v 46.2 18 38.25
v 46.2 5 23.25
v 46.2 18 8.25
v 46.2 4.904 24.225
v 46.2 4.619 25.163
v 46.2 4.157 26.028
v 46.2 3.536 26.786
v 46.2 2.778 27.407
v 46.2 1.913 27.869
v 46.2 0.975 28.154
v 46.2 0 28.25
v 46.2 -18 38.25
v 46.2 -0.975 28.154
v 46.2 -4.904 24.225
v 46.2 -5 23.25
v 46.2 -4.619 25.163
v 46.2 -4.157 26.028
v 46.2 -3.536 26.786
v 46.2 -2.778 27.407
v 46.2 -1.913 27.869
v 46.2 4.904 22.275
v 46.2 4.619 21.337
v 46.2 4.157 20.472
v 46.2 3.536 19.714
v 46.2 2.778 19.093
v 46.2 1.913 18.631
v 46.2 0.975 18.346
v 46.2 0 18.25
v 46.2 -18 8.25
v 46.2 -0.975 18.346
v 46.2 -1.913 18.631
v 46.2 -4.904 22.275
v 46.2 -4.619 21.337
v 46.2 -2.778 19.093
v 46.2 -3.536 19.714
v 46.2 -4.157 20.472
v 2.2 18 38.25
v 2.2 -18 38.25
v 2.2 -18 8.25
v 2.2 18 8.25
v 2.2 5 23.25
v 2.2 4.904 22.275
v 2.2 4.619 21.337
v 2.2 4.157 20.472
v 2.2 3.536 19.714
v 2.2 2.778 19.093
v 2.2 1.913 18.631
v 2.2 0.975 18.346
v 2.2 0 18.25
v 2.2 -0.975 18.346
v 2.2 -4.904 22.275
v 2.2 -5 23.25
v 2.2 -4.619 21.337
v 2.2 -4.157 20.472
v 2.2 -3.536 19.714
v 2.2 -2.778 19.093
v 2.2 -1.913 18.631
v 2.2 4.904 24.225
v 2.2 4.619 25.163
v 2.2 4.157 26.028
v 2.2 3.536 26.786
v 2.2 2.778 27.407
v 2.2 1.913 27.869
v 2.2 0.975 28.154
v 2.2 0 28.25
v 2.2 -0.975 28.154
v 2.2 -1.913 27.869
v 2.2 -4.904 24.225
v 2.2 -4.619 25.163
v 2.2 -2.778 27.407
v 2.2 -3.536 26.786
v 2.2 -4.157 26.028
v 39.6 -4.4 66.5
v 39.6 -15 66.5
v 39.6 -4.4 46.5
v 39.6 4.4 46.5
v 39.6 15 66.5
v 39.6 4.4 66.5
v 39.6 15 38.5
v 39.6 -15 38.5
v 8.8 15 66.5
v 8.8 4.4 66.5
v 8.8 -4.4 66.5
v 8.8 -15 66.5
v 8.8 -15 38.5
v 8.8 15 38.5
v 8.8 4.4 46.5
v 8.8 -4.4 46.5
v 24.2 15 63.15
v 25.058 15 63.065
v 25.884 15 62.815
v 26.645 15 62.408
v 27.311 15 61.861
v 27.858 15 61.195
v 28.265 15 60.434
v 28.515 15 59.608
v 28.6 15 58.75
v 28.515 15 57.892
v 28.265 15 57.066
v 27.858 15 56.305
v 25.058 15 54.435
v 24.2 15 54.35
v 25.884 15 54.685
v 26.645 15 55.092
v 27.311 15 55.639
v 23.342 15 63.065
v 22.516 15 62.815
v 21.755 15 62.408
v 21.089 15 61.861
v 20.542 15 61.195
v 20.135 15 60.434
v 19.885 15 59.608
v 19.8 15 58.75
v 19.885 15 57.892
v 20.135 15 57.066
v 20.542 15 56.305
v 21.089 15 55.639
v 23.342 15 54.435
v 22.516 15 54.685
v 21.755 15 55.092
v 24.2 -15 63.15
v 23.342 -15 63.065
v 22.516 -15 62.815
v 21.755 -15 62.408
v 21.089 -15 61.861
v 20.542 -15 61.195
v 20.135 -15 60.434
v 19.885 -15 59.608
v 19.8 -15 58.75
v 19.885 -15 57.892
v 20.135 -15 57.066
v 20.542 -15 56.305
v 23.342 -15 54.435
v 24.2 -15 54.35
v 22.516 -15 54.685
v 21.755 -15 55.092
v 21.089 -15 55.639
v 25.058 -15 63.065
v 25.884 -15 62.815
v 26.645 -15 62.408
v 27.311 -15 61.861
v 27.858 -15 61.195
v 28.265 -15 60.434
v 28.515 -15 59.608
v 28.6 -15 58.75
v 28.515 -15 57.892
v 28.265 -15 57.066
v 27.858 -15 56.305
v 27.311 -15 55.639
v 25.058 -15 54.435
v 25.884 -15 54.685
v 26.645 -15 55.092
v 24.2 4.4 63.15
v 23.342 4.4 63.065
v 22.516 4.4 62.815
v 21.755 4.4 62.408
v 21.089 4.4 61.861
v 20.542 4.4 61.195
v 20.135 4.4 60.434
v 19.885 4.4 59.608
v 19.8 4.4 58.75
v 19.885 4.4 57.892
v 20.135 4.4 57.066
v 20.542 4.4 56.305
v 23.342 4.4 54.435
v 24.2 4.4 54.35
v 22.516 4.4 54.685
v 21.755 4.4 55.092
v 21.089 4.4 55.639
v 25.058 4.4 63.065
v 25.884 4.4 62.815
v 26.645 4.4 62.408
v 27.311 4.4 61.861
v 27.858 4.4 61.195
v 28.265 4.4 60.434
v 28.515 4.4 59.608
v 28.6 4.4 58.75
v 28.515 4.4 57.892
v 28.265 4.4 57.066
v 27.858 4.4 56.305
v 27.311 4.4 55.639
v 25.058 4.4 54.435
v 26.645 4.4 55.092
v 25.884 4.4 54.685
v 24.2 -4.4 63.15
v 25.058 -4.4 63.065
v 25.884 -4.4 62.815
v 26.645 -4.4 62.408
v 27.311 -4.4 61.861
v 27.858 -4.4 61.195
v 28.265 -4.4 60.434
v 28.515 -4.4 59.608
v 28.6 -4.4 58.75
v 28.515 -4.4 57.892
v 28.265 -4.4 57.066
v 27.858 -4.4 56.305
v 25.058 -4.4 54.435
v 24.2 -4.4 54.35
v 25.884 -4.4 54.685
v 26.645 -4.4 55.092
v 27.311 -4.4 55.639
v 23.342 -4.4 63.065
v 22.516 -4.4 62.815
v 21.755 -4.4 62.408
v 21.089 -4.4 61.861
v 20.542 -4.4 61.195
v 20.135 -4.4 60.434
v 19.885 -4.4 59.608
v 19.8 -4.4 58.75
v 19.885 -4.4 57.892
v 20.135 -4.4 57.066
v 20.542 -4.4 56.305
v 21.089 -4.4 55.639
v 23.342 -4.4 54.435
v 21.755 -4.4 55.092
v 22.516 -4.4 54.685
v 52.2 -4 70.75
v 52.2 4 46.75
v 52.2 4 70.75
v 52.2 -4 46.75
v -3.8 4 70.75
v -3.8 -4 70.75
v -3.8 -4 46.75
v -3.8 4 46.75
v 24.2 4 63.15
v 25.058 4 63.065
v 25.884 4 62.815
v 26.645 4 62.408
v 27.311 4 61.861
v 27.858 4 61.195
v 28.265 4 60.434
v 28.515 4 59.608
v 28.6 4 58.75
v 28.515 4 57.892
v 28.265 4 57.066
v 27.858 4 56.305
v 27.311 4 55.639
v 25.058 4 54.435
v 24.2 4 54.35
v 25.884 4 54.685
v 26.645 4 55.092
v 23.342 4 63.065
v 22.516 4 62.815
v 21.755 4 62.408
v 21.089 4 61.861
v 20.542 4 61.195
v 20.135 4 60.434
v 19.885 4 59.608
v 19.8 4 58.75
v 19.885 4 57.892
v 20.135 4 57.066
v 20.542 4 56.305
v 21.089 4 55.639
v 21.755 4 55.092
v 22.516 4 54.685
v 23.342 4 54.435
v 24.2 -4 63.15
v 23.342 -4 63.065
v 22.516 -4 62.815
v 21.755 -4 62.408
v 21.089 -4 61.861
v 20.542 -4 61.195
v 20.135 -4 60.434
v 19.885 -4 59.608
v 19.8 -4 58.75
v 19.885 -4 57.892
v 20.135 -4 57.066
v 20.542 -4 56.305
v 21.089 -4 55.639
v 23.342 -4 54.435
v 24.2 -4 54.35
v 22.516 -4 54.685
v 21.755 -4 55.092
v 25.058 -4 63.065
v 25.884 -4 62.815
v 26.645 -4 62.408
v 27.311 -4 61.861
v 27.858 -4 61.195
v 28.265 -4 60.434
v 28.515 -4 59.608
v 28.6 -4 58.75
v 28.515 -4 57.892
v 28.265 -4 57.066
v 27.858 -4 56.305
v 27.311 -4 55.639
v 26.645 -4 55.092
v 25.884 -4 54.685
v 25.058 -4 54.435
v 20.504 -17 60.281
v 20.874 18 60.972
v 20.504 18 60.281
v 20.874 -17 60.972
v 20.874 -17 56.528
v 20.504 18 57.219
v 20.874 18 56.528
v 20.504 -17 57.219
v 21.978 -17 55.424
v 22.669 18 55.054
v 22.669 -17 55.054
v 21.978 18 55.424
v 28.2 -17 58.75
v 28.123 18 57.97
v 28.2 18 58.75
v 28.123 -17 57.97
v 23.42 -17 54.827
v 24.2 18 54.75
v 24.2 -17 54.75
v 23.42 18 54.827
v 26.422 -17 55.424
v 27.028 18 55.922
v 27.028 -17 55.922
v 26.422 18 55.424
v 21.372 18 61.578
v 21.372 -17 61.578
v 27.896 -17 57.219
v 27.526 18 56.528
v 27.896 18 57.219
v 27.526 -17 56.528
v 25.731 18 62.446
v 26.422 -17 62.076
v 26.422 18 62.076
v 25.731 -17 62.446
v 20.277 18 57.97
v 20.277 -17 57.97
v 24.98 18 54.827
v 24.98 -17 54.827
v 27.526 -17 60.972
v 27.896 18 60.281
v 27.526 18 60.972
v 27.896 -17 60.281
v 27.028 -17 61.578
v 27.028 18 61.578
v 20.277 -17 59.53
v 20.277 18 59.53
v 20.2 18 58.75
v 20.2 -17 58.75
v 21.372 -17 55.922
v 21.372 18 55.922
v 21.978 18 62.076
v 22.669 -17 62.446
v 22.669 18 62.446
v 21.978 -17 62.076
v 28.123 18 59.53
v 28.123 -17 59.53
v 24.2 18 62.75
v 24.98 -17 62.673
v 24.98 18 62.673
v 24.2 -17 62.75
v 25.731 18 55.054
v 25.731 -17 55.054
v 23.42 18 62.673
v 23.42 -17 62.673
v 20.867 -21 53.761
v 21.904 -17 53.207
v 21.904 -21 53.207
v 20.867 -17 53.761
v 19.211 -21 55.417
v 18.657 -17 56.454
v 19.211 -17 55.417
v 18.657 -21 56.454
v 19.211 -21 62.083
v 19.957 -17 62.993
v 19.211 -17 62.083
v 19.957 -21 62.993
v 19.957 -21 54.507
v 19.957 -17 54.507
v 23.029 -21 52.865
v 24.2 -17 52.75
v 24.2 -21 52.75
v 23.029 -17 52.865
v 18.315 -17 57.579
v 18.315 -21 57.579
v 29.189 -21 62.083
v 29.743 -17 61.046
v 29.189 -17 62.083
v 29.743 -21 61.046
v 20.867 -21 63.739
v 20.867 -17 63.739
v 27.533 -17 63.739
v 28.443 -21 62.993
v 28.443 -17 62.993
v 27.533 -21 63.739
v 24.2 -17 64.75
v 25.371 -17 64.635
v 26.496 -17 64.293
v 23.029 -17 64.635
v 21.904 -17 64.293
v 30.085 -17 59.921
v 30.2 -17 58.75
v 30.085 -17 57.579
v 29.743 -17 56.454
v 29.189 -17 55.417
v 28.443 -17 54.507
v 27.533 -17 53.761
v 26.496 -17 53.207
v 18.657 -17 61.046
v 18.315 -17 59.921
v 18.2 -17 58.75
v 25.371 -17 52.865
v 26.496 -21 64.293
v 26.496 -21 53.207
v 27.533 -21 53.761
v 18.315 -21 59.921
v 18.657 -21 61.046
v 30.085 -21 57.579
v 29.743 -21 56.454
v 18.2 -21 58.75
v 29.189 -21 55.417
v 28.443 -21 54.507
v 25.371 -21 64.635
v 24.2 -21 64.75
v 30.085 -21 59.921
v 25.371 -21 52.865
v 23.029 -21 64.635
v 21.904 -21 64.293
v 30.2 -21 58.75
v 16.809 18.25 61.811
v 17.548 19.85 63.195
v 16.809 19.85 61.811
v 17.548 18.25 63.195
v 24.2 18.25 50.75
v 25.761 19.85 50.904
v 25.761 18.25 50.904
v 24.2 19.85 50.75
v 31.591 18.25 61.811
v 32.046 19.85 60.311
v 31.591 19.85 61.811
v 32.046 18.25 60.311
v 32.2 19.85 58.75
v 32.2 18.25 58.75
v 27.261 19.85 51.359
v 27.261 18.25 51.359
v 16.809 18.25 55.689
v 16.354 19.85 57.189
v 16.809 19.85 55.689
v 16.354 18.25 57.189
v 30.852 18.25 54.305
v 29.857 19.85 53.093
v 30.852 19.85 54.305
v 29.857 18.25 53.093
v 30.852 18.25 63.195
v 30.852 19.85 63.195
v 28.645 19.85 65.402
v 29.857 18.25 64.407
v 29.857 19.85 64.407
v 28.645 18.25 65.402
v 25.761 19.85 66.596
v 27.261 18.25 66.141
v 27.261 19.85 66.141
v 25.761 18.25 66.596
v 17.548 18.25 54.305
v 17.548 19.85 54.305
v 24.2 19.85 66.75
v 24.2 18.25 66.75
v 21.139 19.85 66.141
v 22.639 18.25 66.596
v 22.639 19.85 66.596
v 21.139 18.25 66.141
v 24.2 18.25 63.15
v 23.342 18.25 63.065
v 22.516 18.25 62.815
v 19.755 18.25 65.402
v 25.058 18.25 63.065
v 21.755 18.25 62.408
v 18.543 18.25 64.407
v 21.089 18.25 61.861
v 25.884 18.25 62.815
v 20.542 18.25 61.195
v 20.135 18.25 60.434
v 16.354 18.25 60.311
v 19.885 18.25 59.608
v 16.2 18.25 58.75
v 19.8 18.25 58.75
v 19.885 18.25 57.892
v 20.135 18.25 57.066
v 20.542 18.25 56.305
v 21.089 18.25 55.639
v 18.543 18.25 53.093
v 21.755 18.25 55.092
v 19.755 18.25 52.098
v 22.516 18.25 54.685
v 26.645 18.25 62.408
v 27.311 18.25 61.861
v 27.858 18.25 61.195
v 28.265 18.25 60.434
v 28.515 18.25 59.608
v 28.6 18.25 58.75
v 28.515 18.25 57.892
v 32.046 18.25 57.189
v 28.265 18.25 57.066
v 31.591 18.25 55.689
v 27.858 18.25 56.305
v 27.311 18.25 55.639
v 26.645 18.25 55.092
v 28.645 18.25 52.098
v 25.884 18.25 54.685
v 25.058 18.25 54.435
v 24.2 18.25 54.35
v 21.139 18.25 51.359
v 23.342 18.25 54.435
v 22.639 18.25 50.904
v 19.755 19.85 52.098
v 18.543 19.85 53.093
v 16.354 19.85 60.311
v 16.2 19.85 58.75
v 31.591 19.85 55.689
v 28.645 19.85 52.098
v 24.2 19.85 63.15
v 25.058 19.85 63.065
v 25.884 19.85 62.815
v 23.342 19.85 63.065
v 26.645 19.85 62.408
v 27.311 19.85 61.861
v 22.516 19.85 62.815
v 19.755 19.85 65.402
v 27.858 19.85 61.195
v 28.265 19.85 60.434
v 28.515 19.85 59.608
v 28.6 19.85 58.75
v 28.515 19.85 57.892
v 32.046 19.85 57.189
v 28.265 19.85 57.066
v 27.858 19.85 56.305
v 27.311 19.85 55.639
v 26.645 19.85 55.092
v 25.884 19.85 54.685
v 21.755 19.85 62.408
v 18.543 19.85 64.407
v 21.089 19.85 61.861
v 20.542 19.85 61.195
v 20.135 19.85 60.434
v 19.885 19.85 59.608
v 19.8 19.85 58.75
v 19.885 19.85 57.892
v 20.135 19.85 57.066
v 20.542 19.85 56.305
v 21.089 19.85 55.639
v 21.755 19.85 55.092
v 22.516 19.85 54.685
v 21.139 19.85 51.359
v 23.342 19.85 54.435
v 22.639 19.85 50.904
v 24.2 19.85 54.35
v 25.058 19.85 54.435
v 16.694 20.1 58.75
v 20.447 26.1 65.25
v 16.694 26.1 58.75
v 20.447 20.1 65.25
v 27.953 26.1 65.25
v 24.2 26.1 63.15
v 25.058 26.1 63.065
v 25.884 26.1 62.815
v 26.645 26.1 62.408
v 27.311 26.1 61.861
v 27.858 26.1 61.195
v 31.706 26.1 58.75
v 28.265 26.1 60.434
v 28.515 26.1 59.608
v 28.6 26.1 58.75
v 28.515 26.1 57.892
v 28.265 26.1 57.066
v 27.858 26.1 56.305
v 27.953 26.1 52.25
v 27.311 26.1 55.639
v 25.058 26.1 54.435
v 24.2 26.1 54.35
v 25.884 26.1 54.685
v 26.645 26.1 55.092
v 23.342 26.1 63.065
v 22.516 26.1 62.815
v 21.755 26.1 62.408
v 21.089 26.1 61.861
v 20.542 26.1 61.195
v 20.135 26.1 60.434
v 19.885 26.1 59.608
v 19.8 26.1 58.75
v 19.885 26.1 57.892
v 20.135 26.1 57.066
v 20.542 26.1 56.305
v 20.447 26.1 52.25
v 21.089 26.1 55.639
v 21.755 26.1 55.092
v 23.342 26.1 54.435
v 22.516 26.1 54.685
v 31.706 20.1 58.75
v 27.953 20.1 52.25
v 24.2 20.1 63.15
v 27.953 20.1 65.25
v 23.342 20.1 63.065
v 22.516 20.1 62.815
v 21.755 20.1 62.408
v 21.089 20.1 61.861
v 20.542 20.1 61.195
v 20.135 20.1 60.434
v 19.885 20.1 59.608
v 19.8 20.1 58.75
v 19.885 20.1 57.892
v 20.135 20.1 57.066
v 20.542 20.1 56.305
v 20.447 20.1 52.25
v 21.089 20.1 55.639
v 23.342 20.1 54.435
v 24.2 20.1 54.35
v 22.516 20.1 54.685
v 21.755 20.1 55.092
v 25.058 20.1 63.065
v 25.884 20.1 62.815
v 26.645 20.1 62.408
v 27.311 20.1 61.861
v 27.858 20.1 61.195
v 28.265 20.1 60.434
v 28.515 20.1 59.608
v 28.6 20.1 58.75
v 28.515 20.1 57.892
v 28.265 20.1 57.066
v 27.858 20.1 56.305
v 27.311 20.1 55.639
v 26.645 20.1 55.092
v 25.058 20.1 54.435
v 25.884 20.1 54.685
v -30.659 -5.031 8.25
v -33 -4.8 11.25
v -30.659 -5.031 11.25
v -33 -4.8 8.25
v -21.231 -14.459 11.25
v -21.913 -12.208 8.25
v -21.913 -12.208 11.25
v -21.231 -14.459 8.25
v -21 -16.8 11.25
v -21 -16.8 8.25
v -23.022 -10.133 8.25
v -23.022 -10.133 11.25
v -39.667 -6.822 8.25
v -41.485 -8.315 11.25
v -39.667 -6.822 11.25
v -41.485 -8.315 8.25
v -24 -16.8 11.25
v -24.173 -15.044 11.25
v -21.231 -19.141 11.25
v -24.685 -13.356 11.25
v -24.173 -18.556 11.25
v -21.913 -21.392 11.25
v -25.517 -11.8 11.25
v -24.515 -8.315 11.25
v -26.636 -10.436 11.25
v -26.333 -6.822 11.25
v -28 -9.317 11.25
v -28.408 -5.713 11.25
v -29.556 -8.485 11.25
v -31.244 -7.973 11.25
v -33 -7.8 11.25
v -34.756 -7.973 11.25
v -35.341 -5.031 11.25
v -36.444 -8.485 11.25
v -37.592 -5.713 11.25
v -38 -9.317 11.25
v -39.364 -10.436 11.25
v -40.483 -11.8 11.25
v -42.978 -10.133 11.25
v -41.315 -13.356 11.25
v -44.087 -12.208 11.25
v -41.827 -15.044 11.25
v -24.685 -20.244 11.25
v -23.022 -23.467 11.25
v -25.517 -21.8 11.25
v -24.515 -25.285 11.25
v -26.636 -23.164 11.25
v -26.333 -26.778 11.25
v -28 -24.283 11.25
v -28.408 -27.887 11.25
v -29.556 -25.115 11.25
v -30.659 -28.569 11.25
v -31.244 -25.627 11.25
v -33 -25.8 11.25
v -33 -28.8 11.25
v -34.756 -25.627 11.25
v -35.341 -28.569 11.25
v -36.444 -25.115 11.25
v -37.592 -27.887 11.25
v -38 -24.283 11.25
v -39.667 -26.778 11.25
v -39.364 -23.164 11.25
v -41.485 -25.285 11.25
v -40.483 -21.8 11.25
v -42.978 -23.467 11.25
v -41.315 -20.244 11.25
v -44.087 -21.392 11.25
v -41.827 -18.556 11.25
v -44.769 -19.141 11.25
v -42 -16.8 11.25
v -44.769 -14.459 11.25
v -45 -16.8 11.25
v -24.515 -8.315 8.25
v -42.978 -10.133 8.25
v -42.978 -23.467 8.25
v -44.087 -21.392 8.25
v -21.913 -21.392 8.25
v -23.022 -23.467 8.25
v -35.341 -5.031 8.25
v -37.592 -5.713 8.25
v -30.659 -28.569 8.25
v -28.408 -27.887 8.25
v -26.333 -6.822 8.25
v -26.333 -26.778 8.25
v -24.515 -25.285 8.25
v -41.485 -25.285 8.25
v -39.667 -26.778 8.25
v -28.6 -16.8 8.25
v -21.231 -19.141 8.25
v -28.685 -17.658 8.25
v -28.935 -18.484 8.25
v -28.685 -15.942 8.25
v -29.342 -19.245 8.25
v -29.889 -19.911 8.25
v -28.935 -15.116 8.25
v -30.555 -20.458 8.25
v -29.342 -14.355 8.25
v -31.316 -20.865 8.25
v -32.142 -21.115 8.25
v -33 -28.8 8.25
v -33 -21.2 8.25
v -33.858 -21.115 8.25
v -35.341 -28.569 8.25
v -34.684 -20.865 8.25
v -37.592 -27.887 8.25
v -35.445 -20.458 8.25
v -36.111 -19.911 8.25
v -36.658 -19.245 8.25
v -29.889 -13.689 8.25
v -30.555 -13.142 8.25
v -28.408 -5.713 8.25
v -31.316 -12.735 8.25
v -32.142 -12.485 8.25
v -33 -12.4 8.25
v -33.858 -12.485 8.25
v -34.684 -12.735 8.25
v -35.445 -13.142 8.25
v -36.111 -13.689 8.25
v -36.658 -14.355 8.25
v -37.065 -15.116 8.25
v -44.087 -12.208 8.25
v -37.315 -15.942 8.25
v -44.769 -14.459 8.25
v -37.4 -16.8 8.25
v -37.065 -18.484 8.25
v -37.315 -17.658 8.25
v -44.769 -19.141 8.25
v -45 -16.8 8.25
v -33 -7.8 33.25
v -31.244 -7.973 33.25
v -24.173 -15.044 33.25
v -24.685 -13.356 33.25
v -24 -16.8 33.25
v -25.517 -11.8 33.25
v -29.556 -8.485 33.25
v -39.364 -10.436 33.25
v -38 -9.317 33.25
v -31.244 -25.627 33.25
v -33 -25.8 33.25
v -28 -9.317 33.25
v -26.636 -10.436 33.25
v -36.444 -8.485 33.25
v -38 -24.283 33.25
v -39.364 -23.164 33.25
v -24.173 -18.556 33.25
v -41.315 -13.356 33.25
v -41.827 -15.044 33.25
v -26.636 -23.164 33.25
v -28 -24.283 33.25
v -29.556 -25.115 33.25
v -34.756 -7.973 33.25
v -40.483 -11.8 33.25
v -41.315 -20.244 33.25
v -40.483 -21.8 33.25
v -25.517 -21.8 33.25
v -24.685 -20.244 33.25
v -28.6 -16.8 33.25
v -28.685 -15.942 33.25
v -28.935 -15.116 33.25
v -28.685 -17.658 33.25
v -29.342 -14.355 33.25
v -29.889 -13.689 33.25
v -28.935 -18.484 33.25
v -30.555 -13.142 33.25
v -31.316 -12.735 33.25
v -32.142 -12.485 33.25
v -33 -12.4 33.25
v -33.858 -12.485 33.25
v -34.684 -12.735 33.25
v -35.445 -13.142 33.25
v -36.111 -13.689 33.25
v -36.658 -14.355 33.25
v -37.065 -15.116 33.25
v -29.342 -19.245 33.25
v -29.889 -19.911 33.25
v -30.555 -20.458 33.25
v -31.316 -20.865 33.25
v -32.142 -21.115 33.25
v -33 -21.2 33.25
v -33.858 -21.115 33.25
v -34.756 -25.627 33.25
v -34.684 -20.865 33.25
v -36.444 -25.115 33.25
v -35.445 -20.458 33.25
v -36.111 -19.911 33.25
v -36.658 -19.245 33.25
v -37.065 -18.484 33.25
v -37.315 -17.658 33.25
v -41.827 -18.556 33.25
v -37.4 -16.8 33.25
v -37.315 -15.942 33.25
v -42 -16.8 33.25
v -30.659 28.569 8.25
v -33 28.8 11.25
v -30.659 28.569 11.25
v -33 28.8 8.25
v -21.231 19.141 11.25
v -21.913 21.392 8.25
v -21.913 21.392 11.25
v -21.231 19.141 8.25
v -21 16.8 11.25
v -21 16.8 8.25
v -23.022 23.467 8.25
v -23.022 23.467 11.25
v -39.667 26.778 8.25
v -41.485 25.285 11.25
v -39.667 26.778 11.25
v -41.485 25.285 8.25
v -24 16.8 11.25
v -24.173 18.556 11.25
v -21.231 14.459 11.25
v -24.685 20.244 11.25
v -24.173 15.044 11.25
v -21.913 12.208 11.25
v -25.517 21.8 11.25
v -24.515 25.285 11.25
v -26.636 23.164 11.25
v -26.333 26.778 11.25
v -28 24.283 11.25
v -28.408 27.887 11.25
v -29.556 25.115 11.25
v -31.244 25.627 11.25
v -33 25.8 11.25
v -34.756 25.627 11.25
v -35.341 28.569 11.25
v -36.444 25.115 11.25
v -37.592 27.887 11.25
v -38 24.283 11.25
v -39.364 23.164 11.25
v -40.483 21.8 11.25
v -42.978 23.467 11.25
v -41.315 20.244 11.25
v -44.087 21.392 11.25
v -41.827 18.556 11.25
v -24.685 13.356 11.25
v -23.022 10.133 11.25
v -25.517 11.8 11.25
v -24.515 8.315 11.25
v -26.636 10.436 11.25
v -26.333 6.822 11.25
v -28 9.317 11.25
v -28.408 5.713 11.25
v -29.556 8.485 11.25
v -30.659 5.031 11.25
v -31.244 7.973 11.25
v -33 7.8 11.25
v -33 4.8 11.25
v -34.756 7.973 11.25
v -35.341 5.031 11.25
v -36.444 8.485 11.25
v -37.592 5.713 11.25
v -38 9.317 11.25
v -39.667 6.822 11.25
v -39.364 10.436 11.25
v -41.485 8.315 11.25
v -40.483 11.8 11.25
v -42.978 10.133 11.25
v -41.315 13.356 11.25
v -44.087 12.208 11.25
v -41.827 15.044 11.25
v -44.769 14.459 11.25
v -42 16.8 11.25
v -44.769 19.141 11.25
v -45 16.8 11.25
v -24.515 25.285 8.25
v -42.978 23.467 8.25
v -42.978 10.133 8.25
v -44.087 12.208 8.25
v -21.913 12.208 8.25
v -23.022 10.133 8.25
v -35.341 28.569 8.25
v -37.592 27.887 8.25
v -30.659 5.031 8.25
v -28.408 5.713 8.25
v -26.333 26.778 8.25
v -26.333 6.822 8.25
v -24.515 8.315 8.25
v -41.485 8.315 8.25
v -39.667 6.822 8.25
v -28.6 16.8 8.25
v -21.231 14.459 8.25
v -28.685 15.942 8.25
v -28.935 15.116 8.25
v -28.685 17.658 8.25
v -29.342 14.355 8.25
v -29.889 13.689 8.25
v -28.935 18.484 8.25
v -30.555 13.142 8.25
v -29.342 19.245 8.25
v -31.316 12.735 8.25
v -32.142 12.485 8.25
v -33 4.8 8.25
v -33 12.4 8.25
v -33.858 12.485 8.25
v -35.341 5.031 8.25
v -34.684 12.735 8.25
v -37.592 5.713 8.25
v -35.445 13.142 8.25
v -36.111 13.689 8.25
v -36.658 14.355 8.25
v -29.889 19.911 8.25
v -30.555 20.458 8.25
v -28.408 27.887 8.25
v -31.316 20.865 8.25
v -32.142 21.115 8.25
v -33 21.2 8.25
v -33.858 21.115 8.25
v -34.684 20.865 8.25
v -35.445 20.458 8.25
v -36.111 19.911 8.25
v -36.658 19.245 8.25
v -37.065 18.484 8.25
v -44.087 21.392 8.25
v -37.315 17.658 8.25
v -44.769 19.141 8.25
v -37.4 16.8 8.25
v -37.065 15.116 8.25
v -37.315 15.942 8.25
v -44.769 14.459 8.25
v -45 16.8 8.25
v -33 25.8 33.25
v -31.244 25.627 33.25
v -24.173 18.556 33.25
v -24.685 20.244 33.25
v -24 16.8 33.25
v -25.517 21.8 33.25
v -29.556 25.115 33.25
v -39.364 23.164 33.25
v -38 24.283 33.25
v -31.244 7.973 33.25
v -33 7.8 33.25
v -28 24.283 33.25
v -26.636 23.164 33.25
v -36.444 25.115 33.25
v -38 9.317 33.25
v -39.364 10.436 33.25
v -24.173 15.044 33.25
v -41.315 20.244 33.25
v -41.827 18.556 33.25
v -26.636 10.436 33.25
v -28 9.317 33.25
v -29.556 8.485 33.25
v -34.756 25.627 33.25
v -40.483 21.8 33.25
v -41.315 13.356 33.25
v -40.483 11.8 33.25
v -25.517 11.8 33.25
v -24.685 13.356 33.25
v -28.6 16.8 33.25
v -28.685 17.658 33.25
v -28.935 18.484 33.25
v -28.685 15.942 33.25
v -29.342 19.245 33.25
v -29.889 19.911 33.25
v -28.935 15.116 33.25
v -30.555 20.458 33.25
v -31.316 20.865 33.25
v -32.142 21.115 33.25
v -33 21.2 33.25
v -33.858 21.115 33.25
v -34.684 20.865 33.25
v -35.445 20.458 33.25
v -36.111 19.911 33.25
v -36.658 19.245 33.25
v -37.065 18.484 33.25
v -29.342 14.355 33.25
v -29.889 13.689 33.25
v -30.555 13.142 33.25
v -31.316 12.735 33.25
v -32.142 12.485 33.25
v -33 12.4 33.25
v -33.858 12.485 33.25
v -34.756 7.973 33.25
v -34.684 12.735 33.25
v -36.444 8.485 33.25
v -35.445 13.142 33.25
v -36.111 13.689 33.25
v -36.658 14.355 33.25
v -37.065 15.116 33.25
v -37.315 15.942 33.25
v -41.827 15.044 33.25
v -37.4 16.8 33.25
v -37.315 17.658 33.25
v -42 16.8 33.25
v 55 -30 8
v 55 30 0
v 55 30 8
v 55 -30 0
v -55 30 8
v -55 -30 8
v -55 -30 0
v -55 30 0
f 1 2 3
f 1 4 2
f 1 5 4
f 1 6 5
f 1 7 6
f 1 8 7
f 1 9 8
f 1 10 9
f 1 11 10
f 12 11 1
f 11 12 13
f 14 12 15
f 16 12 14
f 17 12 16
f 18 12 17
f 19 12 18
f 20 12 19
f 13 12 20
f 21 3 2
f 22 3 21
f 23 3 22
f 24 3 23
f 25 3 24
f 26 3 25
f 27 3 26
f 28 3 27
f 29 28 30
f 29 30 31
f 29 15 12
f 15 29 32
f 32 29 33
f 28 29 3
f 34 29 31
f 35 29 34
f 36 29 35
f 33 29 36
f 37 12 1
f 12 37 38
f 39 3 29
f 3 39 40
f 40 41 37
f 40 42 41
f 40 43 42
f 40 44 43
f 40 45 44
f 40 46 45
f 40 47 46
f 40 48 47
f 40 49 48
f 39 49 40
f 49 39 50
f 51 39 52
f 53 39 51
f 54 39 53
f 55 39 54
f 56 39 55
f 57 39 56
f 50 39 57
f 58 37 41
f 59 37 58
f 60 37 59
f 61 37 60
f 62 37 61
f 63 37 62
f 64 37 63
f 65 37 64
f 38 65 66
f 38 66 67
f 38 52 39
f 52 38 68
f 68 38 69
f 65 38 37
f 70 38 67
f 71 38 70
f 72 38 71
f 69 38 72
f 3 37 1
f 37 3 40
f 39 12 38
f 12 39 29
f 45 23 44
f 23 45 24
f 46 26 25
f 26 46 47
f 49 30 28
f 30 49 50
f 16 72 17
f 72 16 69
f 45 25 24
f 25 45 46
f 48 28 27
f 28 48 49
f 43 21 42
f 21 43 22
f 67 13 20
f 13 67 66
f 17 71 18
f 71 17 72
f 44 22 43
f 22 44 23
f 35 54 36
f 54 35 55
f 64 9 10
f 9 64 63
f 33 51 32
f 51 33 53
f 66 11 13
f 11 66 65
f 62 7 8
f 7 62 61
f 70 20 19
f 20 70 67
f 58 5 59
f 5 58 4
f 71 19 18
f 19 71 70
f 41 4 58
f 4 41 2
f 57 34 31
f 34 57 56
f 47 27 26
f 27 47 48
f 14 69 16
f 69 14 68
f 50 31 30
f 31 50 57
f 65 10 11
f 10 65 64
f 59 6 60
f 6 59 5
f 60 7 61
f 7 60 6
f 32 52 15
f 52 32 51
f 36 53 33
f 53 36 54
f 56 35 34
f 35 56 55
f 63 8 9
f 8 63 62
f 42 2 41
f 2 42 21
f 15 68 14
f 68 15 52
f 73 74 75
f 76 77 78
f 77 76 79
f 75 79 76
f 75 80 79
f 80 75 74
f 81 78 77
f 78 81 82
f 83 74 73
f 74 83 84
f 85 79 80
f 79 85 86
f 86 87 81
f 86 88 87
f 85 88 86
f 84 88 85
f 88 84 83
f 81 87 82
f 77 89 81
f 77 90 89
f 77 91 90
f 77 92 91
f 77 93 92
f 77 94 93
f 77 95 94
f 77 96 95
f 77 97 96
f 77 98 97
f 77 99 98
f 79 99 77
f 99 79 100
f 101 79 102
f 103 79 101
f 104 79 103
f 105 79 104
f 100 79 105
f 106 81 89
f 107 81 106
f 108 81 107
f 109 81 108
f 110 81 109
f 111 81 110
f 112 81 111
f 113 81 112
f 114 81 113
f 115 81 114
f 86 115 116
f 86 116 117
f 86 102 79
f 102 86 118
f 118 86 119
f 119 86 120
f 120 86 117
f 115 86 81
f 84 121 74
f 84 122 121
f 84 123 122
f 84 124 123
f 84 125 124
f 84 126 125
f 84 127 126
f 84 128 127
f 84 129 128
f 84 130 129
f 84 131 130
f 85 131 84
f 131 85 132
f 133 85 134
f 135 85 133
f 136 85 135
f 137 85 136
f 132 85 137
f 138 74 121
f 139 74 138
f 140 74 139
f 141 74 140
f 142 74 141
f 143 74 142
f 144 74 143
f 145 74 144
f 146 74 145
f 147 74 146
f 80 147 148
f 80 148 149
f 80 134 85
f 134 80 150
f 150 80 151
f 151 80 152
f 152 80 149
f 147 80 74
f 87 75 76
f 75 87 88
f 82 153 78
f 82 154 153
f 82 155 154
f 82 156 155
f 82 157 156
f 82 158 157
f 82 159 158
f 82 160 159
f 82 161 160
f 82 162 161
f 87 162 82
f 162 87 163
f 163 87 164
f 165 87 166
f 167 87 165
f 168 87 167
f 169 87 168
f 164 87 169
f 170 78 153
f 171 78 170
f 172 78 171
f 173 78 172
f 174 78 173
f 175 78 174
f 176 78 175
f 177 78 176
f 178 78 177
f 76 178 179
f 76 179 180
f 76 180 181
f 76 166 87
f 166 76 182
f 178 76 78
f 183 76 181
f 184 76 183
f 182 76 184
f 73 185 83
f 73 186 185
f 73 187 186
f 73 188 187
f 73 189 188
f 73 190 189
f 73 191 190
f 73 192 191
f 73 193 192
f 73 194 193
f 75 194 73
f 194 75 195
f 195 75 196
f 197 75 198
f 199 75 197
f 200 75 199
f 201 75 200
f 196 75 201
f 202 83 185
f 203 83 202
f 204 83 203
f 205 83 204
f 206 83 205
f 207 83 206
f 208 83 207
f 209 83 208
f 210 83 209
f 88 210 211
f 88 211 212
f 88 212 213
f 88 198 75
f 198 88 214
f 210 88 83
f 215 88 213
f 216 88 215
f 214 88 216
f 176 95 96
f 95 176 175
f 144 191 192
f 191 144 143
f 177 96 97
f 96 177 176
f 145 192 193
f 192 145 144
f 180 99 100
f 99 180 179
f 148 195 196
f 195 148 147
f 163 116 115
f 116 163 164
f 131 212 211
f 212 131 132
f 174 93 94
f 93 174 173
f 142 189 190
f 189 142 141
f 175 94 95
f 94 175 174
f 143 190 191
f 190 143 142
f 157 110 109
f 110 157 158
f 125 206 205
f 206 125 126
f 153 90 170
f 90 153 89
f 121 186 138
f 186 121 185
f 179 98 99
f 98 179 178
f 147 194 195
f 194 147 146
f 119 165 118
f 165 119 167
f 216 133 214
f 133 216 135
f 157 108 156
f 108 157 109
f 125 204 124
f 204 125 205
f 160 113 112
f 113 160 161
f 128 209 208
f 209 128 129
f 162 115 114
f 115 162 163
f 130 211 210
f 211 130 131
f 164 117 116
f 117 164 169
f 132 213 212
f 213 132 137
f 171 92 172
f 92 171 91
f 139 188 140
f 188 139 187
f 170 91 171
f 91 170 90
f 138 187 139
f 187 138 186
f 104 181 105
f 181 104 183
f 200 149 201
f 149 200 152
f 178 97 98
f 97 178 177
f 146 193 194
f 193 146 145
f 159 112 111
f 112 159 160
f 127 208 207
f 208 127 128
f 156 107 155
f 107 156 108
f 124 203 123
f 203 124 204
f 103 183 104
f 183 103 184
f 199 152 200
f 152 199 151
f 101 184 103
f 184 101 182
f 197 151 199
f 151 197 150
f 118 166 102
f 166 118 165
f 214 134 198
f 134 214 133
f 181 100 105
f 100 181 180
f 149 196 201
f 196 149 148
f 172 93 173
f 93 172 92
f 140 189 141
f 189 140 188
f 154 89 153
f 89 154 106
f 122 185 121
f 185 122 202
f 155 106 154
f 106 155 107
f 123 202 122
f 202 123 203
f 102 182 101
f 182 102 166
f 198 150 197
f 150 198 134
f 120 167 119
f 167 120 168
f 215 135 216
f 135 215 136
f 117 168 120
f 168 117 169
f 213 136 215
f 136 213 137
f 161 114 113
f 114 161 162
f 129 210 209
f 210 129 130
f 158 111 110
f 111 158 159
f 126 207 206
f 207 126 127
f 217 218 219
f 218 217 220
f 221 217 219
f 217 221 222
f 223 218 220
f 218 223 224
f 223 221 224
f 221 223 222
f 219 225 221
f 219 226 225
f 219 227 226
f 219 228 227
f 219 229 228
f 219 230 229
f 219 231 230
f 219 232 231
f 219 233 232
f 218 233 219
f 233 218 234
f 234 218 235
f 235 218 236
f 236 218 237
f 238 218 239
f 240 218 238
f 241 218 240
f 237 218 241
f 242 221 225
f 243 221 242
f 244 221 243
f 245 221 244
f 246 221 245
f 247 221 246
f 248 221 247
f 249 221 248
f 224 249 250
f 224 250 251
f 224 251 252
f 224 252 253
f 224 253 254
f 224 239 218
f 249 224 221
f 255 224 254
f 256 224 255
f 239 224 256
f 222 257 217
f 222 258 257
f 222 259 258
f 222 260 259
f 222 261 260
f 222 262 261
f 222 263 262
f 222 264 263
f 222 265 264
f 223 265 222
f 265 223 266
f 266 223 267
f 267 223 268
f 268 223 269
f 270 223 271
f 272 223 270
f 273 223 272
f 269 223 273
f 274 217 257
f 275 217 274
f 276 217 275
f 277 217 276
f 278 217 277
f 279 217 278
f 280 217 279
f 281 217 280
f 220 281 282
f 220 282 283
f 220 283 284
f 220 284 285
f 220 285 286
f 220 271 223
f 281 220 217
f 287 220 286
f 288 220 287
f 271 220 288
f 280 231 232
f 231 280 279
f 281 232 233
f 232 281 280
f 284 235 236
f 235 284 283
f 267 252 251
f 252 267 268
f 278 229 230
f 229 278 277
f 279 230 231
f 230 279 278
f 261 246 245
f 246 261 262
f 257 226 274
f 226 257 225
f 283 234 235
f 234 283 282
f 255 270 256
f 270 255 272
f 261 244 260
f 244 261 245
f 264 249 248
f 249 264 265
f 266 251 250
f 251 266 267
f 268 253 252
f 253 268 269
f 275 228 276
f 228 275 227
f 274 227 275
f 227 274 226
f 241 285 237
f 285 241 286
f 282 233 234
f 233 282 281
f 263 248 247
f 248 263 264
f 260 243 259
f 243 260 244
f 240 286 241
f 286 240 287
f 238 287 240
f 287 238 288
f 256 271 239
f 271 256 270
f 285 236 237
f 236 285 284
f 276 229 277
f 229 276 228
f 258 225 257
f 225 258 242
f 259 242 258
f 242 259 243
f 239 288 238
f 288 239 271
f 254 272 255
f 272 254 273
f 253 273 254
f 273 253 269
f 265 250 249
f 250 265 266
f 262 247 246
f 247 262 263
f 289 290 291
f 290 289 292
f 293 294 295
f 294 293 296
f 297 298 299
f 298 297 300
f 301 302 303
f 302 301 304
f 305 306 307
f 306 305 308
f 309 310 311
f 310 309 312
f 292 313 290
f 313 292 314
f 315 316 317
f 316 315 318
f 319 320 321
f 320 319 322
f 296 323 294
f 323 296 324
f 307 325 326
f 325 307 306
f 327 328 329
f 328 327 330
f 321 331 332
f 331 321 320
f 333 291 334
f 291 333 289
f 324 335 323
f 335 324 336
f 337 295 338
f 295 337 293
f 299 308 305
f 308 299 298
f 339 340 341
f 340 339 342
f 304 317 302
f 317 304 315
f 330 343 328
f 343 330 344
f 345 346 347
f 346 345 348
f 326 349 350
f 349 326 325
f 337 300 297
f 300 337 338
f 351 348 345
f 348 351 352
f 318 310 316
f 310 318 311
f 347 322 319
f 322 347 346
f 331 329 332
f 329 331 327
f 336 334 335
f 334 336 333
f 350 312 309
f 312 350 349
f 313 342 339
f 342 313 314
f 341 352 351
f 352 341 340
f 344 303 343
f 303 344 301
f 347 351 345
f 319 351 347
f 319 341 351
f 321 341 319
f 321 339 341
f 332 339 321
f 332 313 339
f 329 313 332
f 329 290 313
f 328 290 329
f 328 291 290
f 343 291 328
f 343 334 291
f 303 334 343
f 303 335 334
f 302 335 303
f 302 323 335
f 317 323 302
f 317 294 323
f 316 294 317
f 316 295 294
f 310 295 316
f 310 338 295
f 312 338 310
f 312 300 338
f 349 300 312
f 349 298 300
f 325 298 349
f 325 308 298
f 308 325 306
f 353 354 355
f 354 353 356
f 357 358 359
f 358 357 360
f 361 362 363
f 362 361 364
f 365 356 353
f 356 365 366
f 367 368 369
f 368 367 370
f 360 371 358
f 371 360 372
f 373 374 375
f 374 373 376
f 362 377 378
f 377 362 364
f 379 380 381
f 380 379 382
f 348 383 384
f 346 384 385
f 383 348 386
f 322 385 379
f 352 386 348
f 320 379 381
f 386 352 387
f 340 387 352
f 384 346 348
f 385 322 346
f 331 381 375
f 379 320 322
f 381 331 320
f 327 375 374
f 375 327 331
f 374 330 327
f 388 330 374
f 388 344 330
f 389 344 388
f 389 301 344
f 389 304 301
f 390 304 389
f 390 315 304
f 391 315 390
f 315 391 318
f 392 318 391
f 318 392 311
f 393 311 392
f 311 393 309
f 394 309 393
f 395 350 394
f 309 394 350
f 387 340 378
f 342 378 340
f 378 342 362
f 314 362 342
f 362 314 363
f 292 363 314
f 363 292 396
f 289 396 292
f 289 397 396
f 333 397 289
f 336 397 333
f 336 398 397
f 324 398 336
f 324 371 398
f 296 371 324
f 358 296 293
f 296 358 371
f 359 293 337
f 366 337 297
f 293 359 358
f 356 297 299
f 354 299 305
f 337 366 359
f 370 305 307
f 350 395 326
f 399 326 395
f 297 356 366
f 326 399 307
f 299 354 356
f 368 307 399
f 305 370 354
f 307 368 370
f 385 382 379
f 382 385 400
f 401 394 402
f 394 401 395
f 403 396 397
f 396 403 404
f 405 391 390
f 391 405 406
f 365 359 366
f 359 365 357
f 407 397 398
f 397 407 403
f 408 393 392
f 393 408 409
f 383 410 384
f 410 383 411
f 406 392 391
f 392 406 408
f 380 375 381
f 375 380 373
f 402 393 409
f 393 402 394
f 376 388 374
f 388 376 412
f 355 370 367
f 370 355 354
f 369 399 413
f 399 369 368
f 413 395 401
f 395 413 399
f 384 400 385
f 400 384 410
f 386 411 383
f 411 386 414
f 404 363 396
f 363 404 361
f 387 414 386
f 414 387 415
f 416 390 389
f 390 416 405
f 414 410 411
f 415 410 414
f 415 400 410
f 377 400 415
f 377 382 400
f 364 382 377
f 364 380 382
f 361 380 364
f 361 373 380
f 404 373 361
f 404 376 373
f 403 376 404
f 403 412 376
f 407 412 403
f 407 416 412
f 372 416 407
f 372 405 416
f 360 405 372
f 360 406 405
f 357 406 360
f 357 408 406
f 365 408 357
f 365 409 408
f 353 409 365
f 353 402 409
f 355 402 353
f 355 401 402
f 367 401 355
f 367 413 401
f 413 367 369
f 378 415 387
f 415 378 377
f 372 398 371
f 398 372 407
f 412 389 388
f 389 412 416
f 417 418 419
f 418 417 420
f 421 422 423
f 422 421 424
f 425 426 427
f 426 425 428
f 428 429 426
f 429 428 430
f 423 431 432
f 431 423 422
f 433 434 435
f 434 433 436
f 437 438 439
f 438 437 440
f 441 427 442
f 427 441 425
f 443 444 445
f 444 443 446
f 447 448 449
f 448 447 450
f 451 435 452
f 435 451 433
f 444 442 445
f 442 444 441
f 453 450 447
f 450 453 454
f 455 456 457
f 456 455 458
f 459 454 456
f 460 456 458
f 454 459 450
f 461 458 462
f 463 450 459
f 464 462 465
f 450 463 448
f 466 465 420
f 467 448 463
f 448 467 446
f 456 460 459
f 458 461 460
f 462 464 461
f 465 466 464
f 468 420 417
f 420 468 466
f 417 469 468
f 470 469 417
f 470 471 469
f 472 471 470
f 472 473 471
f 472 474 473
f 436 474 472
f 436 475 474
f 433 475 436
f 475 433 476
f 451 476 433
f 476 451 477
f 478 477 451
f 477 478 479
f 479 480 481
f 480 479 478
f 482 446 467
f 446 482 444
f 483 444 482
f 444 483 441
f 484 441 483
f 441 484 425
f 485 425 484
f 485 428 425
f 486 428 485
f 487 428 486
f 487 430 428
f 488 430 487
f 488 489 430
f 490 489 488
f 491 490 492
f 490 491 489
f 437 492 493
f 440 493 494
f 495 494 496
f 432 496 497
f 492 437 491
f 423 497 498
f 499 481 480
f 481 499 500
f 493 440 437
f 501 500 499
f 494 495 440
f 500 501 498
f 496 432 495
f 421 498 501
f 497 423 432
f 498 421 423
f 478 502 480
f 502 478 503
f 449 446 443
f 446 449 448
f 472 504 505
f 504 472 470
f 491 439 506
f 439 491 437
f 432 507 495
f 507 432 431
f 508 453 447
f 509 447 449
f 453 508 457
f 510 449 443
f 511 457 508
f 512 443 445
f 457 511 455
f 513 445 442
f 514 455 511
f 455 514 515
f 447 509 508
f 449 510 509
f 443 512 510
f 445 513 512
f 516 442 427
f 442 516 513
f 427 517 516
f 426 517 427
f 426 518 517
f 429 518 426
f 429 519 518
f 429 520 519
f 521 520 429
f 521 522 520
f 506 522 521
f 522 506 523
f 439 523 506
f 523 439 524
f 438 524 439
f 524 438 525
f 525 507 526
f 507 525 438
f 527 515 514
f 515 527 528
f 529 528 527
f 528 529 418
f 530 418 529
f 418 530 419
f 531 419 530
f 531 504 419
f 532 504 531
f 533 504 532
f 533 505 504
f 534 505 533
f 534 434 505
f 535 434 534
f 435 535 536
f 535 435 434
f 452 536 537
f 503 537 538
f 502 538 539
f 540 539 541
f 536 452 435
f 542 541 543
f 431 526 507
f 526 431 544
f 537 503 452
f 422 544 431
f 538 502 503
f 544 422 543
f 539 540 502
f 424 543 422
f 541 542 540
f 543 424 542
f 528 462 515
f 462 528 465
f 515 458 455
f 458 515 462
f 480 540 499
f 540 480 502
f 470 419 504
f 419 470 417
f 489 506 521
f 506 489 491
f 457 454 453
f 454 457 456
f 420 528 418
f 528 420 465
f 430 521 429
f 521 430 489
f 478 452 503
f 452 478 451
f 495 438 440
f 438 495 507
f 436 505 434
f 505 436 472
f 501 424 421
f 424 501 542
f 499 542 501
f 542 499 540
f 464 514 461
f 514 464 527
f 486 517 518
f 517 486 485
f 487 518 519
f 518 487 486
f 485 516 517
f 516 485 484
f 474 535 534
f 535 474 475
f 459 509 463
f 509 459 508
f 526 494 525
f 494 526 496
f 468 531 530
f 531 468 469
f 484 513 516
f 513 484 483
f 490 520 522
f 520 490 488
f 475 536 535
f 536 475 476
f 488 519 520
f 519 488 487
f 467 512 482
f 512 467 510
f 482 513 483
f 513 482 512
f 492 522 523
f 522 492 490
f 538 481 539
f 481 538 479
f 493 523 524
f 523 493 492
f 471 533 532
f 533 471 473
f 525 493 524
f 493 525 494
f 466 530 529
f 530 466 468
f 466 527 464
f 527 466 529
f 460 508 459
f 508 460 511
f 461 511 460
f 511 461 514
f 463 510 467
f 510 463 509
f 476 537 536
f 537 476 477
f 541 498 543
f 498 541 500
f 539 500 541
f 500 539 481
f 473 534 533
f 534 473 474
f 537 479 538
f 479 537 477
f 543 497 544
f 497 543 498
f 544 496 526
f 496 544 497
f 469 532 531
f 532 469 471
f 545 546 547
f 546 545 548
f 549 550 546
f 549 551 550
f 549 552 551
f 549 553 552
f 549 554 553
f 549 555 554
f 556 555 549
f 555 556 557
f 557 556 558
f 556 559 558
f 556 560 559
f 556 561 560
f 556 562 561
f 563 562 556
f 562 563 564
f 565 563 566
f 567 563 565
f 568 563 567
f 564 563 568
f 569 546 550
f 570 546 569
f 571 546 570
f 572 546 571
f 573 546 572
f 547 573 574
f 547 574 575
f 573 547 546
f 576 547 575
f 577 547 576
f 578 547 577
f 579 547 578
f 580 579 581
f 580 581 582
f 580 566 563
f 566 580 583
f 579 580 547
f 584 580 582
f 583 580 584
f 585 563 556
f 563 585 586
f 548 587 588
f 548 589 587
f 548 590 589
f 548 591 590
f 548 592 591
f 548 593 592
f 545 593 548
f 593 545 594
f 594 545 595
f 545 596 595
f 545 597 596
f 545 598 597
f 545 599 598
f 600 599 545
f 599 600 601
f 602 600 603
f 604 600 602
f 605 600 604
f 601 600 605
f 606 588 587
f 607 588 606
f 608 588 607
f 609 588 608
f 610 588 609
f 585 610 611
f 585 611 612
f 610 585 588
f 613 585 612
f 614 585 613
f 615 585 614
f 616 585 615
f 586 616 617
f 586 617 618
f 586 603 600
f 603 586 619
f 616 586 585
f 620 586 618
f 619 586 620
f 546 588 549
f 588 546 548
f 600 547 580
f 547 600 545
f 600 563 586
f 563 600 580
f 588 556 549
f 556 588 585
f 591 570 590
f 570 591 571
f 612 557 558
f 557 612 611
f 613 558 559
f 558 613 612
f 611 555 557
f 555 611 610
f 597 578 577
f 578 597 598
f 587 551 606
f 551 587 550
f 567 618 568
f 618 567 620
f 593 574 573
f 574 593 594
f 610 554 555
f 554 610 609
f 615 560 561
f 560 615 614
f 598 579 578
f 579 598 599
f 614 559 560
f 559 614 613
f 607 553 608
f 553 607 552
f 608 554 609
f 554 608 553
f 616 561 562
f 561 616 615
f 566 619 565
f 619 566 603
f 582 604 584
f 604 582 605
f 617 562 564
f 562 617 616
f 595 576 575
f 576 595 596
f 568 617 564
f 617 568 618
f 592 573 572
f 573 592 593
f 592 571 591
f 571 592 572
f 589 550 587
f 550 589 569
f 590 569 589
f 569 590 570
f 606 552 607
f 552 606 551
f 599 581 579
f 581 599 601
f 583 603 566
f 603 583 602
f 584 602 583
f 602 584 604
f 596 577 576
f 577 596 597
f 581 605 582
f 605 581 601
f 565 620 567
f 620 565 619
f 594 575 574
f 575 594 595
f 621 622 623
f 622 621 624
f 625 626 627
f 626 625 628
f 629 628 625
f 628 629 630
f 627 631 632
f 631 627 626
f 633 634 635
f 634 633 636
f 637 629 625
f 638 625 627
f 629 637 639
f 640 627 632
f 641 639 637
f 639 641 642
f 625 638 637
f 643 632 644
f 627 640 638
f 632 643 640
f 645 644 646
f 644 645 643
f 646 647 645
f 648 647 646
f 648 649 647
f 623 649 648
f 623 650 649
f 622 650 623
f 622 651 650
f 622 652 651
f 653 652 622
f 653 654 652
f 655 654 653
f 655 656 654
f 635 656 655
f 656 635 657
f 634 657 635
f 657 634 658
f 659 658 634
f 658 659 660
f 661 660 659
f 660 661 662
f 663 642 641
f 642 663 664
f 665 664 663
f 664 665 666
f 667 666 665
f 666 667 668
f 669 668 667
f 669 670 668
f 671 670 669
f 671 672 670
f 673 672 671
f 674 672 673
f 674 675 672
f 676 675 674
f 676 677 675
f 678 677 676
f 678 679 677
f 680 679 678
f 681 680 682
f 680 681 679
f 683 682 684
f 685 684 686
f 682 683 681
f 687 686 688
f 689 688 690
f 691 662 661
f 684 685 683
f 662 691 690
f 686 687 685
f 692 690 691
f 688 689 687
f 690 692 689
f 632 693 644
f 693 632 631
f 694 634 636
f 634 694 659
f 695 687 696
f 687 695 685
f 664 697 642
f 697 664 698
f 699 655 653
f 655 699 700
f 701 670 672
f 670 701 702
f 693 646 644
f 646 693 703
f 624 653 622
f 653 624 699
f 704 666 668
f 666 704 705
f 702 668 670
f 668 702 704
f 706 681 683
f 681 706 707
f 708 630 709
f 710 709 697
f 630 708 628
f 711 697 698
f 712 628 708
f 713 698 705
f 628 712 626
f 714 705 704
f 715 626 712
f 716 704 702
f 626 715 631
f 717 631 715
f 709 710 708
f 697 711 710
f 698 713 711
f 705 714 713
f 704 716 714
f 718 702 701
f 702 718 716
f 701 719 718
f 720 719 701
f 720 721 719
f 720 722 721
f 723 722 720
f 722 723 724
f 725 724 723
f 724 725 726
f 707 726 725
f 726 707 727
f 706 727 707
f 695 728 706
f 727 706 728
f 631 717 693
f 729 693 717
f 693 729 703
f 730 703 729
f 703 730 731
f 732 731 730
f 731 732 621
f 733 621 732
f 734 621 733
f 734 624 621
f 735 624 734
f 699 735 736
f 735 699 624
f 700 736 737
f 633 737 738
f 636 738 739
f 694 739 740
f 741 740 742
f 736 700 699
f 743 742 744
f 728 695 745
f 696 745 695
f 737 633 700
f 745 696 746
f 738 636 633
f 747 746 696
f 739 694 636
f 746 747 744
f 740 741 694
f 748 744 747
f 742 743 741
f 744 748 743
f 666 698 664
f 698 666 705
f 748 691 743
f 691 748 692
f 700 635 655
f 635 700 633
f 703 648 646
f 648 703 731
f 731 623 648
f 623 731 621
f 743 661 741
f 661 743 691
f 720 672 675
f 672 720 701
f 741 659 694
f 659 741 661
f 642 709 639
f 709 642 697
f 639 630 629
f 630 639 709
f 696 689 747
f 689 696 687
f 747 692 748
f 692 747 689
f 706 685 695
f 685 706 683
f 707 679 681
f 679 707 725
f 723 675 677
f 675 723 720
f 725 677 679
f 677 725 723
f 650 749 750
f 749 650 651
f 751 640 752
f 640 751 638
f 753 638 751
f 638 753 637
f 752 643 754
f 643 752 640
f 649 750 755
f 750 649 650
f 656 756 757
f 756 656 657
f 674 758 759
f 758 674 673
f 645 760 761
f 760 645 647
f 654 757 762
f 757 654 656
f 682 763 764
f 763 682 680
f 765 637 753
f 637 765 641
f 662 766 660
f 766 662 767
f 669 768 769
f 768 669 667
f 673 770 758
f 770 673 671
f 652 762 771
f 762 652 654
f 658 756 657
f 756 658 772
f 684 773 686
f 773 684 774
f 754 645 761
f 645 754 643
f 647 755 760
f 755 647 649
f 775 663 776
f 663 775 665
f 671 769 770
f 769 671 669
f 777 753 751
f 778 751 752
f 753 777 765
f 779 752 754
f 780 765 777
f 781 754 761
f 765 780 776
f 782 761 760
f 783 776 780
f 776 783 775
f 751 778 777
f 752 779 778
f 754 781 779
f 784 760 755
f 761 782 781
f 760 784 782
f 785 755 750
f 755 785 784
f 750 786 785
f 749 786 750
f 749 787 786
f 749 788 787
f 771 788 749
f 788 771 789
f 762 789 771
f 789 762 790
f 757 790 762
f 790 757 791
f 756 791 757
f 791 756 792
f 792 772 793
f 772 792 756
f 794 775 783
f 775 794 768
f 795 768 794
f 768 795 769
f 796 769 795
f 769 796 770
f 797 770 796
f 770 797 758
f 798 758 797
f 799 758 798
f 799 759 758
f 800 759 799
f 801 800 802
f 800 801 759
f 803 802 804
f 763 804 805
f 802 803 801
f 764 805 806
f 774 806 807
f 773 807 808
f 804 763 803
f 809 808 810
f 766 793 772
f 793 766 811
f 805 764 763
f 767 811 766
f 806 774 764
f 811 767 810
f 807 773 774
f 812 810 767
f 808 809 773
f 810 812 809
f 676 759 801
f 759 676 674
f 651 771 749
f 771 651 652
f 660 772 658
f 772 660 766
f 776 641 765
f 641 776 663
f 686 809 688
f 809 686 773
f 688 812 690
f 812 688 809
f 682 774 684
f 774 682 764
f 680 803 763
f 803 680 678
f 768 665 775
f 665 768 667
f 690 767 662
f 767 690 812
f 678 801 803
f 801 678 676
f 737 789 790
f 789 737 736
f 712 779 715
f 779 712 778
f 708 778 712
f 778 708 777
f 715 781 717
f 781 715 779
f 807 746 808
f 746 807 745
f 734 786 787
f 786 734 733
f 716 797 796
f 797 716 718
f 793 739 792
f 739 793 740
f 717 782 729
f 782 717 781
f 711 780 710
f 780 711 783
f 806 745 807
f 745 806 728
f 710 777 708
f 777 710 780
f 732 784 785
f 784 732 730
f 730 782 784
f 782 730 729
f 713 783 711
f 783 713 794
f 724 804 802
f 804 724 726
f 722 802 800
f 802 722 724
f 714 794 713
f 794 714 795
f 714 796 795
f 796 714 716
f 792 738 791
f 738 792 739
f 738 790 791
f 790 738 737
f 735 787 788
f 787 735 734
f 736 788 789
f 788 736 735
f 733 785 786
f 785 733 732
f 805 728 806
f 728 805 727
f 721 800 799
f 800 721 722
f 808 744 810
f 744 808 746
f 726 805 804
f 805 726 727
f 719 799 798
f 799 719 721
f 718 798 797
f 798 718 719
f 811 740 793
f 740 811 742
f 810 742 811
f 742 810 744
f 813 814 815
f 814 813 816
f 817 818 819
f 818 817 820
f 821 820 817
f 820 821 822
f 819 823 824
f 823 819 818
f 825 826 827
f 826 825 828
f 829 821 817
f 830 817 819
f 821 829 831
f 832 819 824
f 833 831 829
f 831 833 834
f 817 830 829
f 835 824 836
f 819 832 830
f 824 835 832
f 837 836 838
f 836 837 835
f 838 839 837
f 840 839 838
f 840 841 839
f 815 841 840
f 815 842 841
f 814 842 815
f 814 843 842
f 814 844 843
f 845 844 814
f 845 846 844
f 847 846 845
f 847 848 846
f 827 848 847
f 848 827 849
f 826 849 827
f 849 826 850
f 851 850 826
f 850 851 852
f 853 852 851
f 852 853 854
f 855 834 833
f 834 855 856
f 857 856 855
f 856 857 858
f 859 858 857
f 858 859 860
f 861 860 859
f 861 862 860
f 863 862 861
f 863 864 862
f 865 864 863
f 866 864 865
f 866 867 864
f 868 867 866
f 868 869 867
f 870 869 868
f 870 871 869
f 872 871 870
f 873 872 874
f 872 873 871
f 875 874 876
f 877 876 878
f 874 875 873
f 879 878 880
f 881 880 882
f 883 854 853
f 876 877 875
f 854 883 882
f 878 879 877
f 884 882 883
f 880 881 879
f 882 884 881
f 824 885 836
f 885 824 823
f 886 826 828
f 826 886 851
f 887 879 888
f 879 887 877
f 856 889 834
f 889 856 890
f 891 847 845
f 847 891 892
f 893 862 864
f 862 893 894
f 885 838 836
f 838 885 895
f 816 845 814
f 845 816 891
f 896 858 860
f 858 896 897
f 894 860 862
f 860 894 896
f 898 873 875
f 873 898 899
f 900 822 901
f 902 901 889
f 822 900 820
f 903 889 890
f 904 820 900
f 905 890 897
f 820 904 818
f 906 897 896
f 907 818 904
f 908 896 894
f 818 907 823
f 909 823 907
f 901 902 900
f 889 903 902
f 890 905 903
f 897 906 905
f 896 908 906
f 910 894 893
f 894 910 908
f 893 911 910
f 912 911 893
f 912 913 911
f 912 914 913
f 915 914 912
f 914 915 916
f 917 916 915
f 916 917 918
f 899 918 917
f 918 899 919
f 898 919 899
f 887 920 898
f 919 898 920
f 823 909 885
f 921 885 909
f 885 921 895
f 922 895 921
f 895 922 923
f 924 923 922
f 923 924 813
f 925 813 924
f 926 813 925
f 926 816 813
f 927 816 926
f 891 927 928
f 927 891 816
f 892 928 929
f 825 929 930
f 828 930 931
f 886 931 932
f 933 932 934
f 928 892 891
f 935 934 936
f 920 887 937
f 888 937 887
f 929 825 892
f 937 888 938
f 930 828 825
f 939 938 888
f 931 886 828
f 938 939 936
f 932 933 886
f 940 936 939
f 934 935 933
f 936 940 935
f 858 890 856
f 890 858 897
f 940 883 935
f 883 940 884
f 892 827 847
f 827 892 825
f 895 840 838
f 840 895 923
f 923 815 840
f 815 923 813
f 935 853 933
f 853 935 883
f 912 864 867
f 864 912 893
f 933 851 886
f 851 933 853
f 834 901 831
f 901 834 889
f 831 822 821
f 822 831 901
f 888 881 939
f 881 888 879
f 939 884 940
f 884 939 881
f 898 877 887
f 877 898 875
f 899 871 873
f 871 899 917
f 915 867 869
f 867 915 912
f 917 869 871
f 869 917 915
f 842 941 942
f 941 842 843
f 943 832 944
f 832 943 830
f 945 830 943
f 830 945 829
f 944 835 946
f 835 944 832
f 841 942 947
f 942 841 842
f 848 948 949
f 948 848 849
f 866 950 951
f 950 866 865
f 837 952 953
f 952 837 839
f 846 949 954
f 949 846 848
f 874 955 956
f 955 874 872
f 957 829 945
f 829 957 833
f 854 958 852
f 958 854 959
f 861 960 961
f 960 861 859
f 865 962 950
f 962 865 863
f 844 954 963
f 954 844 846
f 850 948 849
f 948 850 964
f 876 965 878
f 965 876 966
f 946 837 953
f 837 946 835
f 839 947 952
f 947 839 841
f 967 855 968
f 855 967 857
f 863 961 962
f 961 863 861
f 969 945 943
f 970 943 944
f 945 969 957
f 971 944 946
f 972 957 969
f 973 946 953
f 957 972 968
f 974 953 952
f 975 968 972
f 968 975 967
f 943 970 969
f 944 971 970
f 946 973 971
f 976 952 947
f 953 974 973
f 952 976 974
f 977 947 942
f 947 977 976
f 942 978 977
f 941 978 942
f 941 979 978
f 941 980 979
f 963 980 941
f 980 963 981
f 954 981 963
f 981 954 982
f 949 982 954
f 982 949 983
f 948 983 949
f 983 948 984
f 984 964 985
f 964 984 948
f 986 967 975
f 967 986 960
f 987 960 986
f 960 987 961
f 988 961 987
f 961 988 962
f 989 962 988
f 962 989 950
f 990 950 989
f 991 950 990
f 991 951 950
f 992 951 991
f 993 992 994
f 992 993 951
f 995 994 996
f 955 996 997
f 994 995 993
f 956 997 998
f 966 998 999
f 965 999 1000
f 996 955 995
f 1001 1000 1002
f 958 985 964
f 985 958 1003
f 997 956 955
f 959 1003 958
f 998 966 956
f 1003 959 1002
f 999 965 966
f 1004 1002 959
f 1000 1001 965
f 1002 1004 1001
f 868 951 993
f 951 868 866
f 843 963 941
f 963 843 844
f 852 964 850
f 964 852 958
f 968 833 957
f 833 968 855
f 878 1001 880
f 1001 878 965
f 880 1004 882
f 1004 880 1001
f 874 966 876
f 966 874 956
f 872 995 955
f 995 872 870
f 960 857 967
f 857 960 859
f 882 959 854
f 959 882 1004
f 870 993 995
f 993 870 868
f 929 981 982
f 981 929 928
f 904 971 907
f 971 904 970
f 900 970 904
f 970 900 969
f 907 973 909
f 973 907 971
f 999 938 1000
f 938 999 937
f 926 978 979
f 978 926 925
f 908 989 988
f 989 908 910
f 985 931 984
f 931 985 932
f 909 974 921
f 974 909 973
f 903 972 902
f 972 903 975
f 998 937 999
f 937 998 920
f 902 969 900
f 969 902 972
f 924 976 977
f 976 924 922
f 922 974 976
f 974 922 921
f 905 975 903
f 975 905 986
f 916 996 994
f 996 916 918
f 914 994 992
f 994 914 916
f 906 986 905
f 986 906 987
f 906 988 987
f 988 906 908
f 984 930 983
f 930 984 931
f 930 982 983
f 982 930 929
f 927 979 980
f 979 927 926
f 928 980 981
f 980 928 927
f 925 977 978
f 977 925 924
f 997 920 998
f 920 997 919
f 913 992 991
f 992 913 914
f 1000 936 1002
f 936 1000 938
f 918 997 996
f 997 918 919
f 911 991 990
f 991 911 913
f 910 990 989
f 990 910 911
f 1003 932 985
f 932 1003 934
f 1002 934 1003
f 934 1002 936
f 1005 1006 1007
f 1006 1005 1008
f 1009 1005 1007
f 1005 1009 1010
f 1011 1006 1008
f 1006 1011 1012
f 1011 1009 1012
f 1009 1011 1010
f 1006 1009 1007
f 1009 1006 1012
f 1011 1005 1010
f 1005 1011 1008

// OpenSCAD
$fn = 32;

// ------------------------------------------------------------------------
// Indexing jig: plate 110 x 60 mm, pin d8
// Every part is its own module, assembly() places every instance.
// ------------------------------------------------------------------------

// --- part 1 ---
module jig_plate() {
  difference() {
    translate([-55, -30, 0]) cube([110, 60, 8]);
  }
}

// --- part 2 ---
module locator_block() {
  difference() {
    translate([-22, -18, 0]) cube([44, 36, 30]);
    translate([0, 0, 15]) rotate([0, 90, 0]) cylinder(h = 46, d = 10, center = true);
  }
}

// --- part 3 ---
module index_fork() {
  difference() {
    translate([-15.4, -15, 0]) cube([30.8, 30, 28]);
    translate([-16.4, -4.4, 8]) cube([32.8, 8.8, 21]);
    translate([0, 0, 20.25]) rotate([90, 0, 0]) cylinder(h = 32, d = 8.8, center = true);
  }
}

// --- part 4 ---
module index_arm() {
  difference() {
    translate([-28, -4, 0]) cube([56, 8, 24]);
    translate([0, 0, 12]) rotate([90, 0, 0]) cylinder(h = 10, d = 8.8, center = true);
  }
}

// --- part 5 ---
module index_pin() {
  rotate([0, 90, 0]) cylinder(h = 36, d = 8, center = true);
  translate([-21, 0, 0]) rotate([0, 90, 0]) cylinder(h = 4, d = 12);
}

// --- part 6 ---
module pin_washer() {
  difference() {
      translate([0, 0, 0]) cylinder(h = 1.6, d = 16);
      translate([0, 0, -1]) cylinder(h = 3.6, d = 8.8);
    }
}

// --- part 7 ---
module lock_nut() {
  difference() {
    linear_extrude(height = 6) polygon(points = [[7.506, 0], [3.753, 6.5], [-3.753, 6.5], [-7.506, 0], [-3.753, -6.5], [3.753, -6.5]]);
    translate([0, 0, -1]) cylinder(h = 8, d = 8.8);
  }
}

// --- part 8 ---
module guide_bush_a() {
  difference() {
    union() {
      cylinder(h = 3, d = 24);
      translate([0, 0, 3]) cylinder(h = 22, d = 18);
    }
    translate([0, 0, -1]) cylinder(h = 27, d = 8.8);
  }
}

// --- part 9 ---
module guide_bush_b() {
  difference() {
    union() {
      cylinder(h = 3, d = 24);
      translate([0, 0, 3]) cylinder(h = 22, d = 18);
    }
    translate([0, 0, -1]) cylinder(h = 27, d = 8.8);
  }
}

// --- assembly ---
module assembly() {
  color([0.80, 0.24, 0.20]) translate([0, 0, 0]) rotate([0, 0, 0]) jig_plate();
  color([0.20, 0.45, 0.75]) translate([24.2, 0, 8.25]) rotate([0, 0, 0]) locator_block();
  color([0.25, 0.62, 0.32]) translate([24.2, 0, 38.5]) rotate([0, 0, 0]) index_fork();
  color([0.92, 0.70, 0.18]) translate([24.2, 0, 46.75]) rotate([0, 0, 0]) index_arm();
  color([0.58, 0.35, 0.70]) translate([24.2, 0, 58.75]) rotate([0, 0, 90]) index_pin();
  color([0.16, 0.66, 0.66]) translate([24.2, 19.85, 58.75]) rotate([90, 0, 0]) pin_washer();
  color([0.85, 0.48, 0.18]) translate([24.2, 26.1, 58.75]) rotate([90, 0, 0]) lock_nut();
  color([0.55, 0.60, 0.65]) translate([-33, -16.8, 8.25]) rotate([0, 0, 0]) guide_bush_a();
  color([0.75, 0.30, 0.55]) translate([-33, 16.8, 8.25]) rotate([0, 0, 0]) guide_bush_b();
}

assembly();
